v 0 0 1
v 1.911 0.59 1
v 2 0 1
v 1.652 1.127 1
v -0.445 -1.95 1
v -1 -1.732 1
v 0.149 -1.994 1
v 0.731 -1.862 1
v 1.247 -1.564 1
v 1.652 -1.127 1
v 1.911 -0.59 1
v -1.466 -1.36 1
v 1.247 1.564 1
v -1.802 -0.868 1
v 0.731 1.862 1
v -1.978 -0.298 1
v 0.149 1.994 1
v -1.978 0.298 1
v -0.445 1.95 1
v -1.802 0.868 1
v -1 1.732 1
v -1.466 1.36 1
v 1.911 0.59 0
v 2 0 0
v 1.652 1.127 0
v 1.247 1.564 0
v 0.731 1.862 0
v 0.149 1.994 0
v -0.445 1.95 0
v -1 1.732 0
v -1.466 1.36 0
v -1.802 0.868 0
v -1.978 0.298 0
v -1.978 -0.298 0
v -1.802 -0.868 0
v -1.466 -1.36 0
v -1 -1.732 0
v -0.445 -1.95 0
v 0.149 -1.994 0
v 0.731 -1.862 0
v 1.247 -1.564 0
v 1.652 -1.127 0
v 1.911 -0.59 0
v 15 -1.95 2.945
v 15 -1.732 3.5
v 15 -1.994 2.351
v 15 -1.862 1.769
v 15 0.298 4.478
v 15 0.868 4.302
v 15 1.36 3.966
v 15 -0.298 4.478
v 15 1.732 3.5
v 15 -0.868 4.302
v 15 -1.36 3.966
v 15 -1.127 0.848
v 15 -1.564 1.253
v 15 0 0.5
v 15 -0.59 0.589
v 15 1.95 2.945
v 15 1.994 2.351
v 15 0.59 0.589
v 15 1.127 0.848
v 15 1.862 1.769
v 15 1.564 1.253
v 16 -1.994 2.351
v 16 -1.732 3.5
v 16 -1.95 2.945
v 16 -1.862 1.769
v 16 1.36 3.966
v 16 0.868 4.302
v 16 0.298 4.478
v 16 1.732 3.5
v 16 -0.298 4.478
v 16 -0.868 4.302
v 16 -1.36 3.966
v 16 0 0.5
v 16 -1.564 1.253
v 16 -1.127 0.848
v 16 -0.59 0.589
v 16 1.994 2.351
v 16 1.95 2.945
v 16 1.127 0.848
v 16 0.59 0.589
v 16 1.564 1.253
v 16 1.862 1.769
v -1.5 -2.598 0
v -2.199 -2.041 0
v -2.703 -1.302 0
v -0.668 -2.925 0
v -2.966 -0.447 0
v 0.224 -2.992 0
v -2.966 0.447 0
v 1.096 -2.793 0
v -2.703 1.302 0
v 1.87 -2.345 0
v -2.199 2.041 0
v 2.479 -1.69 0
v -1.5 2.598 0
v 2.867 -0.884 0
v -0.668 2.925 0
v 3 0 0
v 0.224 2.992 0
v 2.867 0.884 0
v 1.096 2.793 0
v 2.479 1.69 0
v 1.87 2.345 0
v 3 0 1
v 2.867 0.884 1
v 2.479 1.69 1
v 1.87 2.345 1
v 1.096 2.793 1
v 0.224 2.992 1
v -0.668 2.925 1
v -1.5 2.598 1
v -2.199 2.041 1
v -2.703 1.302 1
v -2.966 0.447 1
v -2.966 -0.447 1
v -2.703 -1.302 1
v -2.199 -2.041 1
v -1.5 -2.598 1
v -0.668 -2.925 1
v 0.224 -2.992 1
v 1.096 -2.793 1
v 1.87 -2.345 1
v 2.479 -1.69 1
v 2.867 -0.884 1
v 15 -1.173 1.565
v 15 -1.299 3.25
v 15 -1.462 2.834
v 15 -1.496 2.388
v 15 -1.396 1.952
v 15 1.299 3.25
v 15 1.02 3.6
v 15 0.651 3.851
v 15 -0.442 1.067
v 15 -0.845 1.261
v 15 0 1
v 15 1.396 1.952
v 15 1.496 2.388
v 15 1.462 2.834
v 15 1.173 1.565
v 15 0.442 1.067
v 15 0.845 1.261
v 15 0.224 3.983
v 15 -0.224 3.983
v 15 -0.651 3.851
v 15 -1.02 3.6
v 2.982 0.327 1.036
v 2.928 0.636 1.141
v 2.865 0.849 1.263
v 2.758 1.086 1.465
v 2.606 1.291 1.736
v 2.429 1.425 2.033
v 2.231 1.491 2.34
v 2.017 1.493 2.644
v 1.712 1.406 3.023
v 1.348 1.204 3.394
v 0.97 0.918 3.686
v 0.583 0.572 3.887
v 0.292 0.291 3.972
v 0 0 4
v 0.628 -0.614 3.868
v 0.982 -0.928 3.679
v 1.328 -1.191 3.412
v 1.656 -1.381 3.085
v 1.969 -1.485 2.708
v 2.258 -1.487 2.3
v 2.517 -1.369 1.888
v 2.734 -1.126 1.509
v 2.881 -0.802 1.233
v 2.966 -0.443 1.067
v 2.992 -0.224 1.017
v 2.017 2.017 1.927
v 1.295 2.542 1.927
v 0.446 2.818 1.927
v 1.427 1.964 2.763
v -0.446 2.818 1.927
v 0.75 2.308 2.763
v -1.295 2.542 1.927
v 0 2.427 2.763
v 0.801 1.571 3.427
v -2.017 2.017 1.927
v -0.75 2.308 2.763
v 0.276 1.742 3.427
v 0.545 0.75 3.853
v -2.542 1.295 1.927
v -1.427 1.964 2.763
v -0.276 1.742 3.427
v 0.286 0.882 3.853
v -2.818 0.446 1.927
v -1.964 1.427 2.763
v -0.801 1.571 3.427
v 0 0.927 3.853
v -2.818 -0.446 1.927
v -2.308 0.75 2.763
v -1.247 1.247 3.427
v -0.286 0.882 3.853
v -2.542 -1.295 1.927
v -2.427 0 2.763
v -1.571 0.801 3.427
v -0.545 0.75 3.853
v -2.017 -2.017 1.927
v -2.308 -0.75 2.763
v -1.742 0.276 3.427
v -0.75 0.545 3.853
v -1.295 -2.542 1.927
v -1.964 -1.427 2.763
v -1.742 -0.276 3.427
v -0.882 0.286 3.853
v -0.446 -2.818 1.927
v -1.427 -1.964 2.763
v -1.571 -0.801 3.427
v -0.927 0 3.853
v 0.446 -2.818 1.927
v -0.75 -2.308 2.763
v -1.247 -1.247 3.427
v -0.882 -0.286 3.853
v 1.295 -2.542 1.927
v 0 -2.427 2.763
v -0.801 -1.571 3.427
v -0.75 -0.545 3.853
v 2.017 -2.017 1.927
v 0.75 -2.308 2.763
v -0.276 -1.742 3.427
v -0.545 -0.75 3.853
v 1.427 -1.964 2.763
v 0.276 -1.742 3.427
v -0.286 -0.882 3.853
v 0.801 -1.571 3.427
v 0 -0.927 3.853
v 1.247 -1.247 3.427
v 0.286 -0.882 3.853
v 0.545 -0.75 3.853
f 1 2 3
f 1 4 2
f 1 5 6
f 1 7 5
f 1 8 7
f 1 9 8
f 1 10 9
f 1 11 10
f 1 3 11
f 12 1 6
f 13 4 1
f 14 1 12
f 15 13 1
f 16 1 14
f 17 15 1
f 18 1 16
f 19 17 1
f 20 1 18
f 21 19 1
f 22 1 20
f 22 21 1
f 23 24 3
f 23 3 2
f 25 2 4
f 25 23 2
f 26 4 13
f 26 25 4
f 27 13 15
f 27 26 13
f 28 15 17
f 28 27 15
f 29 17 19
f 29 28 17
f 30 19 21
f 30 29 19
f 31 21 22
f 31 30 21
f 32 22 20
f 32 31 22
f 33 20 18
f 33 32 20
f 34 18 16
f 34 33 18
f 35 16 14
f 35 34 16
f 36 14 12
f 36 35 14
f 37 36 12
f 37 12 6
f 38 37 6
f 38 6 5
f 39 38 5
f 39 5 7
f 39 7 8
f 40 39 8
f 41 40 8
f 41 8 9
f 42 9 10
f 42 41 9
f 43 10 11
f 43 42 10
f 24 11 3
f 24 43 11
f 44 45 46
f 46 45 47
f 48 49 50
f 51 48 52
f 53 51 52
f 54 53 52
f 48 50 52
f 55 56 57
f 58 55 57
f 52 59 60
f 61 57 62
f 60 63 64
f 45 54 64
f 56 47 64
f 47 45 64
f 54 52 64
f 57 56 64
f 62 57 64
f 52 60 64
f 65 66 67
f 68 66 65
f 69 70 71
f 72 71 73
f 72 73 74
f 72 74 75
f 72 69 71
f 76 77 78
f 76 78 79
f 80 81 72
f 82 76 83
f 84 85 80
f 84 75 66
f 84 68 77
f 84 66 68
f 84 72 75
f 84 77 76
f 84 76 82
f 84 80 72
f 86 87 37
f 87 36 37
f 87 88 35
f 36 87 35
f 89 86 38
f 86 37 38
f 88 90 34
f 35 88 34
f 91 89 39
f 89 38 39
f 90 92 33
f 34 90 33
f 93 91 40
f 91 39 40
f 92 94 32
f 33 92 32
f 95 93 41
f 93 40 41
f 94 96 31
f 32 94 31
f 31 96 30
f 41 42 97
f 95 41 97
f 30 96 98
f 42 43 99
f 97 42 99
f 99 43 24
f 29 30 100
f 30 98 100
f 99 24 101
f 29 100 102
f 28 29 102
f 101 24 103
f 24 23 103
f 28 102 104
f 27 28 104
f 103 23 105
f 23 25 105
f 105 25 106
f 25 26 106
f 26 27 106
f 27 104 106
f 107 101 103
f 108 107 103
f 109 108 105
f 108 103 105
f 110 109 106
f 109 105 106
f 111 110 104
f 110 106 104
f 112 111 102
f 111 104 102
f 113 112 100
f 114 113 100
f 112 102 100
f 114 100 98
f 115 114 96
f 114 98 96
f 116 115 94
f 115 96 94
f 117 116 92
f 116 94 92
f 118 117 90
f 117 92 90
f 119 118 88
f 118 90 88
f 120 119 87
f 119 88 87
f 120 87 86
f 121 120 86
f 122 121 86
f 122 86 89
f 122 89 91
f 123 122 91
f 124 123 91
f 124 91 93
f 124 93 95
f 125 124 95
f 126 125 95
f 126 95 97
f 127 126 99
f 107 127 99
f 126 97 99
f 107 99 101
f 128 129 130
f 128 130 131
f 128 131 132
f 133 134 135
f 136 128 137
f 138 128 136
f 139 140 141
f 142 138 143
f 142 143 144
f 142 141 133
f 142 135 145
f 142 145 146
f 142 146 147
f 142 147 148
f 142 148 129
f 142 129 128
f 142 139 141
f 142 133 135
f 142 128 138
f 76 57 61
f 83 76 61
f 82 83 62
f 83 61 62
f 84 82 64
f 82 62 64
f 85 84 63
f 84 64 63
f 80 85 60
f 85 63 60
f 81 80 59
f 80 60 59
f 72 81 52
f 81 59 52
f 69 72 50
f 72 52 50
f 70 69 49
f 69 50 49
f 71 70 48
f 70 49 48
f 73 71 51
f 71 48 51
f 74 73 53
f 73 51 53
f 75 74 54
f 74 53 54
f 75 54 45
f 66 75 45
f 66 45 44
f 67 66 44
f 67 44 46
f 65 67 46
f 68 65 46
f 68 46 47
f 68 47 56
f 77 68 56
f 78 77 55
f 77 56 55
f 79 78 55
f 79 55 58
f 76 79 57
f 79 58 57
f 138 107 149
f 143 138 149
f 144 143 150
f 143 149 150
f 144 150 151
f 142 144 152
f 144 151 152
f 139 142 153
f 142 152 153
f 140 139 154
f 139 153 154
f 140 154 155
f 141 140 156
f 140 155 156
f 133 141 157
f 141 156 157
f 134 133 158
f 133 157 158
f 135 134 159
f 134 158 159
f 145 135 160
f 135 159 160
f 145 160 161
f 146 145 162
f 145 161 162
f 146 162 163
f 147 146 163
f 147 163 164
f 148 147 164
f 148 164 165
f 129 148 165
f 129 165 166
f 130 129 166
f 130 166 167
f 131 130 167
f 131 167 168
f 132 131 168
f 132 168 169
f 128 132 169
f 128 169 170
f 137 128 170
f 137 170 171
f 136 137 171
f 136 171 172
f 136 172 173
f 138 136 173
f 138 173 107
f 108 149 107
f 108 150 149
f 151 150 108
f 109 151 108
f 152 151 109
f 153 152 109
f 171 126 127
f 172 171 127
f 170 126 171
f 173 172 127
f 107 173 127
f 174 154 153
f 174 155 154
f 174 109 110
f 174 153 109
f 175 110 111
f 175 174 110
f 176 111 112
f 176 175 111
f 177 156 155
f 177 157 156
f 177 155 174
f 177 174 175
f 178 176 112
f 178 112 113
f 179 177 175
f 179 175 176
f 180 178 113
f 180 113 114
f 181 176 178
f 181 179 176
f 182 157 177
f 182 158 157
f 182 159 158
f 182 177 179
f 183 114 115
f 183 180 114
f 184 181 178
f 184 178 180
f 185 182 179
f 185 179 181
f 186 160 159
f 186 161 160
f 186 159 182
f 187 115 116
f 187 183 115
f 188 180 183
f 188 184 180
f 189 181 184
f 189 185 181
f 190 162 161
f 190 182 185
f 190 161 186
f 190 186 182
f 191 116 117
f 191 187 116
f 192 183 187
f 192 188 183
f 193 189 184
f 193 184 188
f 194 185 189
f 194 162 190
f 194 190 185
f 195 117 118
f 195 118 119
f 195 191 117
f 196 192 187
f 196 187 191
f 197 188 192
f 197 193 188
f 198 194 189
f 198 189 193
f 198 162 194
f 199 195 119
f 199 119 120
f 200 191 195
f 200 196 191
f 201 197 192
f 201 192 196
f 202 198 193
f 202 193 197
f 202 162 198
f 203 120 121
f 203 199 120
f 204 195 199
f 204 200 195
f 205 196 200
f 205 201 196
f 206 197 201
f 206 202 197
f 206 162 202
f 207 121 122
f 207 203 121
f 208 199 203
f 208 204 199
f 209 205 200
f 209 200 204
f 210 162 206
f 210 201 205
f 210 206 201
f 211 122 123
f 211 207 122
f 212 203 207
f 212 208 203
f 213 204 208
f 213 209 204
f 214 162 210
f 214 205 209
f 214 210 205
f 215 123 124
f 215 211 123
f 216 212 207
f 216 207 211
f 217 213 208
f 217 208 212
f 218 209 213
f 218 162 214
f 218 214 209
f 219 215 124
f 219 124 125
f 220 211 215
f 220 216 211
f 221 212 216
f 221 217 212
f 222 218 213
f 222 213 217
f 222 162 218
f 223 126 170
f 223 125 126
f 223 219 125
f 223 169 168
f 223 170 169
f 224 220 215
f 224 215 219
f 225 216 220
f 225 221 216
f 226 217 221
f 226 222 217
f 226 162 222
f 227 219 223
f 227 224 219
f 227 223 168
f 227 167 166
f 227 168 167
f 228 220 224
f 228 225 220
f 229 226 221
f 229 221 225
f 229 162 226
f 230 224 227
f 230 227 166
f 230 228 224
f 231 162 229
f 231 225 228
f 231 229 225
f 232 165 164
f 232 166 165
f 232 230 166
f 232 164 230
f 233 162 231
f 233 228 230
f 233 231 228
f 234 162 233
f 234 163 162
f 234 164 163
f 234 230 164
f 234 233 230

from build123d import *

# Parameters (mm, degrees)
SKETCH_1_R      = 3
SKETCH_1_R_2    = 2
EXTRUDE_1_DEPTH = 1
SKETCH_4_R      = 1.5
EXTRUDE_2_DEPTH = 15
SKETCH_5_R      = 2
EXTRUDE_3_DEPTH = 1


with BuildPart() as part:
    # 草图1 → 凸台-拉伸1 (new body)
    with BuildSketch(Plane.XY):
        Circle(SKETCH_1_R)
        Circle(SKETCH_1_R_2, mode=Mode.SUBTRACT)
    extrude(amount=EXTRUDE_1_DEPTH)

    # 草图2 → 旋转3 (revolve)
    with BuildSketch(Plane(origin=(0, 0, 0), x_dir=(1, 0, 0), z_dir=(0, 1, 0))):
        with BuildLine():
            Line((0, -4), (0, -1))
            Line((0, -1), (3, -1))
            ThreePointArc((3, -1), (2.121320344, -3.121320344), (0, -4))
        make_face()
    revolve(axis=Axis((0, 0, 4), (0, 0, 1)))

    # 草图4 → 凸台-拉伸2 (add)
    with BuildSketch(Plane(origin=(0, 0, 0), x_dir=(0, 0, -1), z_dir=(1, 0, 0))):
        with Locations((-2.5, 0)):
            Circle(SKETCH_4_R)
    extrude(amount=EXTRUDE_2_DEPTH)


with BuildPart() as body_2:
    # 草图5 → 凸台-拉伸3 (new body)
    with BuildSketch(Plane(origin=(15, 0, 0), x_dir=(0, 0, -1), z_dir=(1, 0, 0))):
        with Locations((-2.5, 0)):
            Circle(SKETCH_5_R)
    extrude(amount=EXTRUDE_3_DEPTH)


solid = Compound([part.part, body_2.part])
